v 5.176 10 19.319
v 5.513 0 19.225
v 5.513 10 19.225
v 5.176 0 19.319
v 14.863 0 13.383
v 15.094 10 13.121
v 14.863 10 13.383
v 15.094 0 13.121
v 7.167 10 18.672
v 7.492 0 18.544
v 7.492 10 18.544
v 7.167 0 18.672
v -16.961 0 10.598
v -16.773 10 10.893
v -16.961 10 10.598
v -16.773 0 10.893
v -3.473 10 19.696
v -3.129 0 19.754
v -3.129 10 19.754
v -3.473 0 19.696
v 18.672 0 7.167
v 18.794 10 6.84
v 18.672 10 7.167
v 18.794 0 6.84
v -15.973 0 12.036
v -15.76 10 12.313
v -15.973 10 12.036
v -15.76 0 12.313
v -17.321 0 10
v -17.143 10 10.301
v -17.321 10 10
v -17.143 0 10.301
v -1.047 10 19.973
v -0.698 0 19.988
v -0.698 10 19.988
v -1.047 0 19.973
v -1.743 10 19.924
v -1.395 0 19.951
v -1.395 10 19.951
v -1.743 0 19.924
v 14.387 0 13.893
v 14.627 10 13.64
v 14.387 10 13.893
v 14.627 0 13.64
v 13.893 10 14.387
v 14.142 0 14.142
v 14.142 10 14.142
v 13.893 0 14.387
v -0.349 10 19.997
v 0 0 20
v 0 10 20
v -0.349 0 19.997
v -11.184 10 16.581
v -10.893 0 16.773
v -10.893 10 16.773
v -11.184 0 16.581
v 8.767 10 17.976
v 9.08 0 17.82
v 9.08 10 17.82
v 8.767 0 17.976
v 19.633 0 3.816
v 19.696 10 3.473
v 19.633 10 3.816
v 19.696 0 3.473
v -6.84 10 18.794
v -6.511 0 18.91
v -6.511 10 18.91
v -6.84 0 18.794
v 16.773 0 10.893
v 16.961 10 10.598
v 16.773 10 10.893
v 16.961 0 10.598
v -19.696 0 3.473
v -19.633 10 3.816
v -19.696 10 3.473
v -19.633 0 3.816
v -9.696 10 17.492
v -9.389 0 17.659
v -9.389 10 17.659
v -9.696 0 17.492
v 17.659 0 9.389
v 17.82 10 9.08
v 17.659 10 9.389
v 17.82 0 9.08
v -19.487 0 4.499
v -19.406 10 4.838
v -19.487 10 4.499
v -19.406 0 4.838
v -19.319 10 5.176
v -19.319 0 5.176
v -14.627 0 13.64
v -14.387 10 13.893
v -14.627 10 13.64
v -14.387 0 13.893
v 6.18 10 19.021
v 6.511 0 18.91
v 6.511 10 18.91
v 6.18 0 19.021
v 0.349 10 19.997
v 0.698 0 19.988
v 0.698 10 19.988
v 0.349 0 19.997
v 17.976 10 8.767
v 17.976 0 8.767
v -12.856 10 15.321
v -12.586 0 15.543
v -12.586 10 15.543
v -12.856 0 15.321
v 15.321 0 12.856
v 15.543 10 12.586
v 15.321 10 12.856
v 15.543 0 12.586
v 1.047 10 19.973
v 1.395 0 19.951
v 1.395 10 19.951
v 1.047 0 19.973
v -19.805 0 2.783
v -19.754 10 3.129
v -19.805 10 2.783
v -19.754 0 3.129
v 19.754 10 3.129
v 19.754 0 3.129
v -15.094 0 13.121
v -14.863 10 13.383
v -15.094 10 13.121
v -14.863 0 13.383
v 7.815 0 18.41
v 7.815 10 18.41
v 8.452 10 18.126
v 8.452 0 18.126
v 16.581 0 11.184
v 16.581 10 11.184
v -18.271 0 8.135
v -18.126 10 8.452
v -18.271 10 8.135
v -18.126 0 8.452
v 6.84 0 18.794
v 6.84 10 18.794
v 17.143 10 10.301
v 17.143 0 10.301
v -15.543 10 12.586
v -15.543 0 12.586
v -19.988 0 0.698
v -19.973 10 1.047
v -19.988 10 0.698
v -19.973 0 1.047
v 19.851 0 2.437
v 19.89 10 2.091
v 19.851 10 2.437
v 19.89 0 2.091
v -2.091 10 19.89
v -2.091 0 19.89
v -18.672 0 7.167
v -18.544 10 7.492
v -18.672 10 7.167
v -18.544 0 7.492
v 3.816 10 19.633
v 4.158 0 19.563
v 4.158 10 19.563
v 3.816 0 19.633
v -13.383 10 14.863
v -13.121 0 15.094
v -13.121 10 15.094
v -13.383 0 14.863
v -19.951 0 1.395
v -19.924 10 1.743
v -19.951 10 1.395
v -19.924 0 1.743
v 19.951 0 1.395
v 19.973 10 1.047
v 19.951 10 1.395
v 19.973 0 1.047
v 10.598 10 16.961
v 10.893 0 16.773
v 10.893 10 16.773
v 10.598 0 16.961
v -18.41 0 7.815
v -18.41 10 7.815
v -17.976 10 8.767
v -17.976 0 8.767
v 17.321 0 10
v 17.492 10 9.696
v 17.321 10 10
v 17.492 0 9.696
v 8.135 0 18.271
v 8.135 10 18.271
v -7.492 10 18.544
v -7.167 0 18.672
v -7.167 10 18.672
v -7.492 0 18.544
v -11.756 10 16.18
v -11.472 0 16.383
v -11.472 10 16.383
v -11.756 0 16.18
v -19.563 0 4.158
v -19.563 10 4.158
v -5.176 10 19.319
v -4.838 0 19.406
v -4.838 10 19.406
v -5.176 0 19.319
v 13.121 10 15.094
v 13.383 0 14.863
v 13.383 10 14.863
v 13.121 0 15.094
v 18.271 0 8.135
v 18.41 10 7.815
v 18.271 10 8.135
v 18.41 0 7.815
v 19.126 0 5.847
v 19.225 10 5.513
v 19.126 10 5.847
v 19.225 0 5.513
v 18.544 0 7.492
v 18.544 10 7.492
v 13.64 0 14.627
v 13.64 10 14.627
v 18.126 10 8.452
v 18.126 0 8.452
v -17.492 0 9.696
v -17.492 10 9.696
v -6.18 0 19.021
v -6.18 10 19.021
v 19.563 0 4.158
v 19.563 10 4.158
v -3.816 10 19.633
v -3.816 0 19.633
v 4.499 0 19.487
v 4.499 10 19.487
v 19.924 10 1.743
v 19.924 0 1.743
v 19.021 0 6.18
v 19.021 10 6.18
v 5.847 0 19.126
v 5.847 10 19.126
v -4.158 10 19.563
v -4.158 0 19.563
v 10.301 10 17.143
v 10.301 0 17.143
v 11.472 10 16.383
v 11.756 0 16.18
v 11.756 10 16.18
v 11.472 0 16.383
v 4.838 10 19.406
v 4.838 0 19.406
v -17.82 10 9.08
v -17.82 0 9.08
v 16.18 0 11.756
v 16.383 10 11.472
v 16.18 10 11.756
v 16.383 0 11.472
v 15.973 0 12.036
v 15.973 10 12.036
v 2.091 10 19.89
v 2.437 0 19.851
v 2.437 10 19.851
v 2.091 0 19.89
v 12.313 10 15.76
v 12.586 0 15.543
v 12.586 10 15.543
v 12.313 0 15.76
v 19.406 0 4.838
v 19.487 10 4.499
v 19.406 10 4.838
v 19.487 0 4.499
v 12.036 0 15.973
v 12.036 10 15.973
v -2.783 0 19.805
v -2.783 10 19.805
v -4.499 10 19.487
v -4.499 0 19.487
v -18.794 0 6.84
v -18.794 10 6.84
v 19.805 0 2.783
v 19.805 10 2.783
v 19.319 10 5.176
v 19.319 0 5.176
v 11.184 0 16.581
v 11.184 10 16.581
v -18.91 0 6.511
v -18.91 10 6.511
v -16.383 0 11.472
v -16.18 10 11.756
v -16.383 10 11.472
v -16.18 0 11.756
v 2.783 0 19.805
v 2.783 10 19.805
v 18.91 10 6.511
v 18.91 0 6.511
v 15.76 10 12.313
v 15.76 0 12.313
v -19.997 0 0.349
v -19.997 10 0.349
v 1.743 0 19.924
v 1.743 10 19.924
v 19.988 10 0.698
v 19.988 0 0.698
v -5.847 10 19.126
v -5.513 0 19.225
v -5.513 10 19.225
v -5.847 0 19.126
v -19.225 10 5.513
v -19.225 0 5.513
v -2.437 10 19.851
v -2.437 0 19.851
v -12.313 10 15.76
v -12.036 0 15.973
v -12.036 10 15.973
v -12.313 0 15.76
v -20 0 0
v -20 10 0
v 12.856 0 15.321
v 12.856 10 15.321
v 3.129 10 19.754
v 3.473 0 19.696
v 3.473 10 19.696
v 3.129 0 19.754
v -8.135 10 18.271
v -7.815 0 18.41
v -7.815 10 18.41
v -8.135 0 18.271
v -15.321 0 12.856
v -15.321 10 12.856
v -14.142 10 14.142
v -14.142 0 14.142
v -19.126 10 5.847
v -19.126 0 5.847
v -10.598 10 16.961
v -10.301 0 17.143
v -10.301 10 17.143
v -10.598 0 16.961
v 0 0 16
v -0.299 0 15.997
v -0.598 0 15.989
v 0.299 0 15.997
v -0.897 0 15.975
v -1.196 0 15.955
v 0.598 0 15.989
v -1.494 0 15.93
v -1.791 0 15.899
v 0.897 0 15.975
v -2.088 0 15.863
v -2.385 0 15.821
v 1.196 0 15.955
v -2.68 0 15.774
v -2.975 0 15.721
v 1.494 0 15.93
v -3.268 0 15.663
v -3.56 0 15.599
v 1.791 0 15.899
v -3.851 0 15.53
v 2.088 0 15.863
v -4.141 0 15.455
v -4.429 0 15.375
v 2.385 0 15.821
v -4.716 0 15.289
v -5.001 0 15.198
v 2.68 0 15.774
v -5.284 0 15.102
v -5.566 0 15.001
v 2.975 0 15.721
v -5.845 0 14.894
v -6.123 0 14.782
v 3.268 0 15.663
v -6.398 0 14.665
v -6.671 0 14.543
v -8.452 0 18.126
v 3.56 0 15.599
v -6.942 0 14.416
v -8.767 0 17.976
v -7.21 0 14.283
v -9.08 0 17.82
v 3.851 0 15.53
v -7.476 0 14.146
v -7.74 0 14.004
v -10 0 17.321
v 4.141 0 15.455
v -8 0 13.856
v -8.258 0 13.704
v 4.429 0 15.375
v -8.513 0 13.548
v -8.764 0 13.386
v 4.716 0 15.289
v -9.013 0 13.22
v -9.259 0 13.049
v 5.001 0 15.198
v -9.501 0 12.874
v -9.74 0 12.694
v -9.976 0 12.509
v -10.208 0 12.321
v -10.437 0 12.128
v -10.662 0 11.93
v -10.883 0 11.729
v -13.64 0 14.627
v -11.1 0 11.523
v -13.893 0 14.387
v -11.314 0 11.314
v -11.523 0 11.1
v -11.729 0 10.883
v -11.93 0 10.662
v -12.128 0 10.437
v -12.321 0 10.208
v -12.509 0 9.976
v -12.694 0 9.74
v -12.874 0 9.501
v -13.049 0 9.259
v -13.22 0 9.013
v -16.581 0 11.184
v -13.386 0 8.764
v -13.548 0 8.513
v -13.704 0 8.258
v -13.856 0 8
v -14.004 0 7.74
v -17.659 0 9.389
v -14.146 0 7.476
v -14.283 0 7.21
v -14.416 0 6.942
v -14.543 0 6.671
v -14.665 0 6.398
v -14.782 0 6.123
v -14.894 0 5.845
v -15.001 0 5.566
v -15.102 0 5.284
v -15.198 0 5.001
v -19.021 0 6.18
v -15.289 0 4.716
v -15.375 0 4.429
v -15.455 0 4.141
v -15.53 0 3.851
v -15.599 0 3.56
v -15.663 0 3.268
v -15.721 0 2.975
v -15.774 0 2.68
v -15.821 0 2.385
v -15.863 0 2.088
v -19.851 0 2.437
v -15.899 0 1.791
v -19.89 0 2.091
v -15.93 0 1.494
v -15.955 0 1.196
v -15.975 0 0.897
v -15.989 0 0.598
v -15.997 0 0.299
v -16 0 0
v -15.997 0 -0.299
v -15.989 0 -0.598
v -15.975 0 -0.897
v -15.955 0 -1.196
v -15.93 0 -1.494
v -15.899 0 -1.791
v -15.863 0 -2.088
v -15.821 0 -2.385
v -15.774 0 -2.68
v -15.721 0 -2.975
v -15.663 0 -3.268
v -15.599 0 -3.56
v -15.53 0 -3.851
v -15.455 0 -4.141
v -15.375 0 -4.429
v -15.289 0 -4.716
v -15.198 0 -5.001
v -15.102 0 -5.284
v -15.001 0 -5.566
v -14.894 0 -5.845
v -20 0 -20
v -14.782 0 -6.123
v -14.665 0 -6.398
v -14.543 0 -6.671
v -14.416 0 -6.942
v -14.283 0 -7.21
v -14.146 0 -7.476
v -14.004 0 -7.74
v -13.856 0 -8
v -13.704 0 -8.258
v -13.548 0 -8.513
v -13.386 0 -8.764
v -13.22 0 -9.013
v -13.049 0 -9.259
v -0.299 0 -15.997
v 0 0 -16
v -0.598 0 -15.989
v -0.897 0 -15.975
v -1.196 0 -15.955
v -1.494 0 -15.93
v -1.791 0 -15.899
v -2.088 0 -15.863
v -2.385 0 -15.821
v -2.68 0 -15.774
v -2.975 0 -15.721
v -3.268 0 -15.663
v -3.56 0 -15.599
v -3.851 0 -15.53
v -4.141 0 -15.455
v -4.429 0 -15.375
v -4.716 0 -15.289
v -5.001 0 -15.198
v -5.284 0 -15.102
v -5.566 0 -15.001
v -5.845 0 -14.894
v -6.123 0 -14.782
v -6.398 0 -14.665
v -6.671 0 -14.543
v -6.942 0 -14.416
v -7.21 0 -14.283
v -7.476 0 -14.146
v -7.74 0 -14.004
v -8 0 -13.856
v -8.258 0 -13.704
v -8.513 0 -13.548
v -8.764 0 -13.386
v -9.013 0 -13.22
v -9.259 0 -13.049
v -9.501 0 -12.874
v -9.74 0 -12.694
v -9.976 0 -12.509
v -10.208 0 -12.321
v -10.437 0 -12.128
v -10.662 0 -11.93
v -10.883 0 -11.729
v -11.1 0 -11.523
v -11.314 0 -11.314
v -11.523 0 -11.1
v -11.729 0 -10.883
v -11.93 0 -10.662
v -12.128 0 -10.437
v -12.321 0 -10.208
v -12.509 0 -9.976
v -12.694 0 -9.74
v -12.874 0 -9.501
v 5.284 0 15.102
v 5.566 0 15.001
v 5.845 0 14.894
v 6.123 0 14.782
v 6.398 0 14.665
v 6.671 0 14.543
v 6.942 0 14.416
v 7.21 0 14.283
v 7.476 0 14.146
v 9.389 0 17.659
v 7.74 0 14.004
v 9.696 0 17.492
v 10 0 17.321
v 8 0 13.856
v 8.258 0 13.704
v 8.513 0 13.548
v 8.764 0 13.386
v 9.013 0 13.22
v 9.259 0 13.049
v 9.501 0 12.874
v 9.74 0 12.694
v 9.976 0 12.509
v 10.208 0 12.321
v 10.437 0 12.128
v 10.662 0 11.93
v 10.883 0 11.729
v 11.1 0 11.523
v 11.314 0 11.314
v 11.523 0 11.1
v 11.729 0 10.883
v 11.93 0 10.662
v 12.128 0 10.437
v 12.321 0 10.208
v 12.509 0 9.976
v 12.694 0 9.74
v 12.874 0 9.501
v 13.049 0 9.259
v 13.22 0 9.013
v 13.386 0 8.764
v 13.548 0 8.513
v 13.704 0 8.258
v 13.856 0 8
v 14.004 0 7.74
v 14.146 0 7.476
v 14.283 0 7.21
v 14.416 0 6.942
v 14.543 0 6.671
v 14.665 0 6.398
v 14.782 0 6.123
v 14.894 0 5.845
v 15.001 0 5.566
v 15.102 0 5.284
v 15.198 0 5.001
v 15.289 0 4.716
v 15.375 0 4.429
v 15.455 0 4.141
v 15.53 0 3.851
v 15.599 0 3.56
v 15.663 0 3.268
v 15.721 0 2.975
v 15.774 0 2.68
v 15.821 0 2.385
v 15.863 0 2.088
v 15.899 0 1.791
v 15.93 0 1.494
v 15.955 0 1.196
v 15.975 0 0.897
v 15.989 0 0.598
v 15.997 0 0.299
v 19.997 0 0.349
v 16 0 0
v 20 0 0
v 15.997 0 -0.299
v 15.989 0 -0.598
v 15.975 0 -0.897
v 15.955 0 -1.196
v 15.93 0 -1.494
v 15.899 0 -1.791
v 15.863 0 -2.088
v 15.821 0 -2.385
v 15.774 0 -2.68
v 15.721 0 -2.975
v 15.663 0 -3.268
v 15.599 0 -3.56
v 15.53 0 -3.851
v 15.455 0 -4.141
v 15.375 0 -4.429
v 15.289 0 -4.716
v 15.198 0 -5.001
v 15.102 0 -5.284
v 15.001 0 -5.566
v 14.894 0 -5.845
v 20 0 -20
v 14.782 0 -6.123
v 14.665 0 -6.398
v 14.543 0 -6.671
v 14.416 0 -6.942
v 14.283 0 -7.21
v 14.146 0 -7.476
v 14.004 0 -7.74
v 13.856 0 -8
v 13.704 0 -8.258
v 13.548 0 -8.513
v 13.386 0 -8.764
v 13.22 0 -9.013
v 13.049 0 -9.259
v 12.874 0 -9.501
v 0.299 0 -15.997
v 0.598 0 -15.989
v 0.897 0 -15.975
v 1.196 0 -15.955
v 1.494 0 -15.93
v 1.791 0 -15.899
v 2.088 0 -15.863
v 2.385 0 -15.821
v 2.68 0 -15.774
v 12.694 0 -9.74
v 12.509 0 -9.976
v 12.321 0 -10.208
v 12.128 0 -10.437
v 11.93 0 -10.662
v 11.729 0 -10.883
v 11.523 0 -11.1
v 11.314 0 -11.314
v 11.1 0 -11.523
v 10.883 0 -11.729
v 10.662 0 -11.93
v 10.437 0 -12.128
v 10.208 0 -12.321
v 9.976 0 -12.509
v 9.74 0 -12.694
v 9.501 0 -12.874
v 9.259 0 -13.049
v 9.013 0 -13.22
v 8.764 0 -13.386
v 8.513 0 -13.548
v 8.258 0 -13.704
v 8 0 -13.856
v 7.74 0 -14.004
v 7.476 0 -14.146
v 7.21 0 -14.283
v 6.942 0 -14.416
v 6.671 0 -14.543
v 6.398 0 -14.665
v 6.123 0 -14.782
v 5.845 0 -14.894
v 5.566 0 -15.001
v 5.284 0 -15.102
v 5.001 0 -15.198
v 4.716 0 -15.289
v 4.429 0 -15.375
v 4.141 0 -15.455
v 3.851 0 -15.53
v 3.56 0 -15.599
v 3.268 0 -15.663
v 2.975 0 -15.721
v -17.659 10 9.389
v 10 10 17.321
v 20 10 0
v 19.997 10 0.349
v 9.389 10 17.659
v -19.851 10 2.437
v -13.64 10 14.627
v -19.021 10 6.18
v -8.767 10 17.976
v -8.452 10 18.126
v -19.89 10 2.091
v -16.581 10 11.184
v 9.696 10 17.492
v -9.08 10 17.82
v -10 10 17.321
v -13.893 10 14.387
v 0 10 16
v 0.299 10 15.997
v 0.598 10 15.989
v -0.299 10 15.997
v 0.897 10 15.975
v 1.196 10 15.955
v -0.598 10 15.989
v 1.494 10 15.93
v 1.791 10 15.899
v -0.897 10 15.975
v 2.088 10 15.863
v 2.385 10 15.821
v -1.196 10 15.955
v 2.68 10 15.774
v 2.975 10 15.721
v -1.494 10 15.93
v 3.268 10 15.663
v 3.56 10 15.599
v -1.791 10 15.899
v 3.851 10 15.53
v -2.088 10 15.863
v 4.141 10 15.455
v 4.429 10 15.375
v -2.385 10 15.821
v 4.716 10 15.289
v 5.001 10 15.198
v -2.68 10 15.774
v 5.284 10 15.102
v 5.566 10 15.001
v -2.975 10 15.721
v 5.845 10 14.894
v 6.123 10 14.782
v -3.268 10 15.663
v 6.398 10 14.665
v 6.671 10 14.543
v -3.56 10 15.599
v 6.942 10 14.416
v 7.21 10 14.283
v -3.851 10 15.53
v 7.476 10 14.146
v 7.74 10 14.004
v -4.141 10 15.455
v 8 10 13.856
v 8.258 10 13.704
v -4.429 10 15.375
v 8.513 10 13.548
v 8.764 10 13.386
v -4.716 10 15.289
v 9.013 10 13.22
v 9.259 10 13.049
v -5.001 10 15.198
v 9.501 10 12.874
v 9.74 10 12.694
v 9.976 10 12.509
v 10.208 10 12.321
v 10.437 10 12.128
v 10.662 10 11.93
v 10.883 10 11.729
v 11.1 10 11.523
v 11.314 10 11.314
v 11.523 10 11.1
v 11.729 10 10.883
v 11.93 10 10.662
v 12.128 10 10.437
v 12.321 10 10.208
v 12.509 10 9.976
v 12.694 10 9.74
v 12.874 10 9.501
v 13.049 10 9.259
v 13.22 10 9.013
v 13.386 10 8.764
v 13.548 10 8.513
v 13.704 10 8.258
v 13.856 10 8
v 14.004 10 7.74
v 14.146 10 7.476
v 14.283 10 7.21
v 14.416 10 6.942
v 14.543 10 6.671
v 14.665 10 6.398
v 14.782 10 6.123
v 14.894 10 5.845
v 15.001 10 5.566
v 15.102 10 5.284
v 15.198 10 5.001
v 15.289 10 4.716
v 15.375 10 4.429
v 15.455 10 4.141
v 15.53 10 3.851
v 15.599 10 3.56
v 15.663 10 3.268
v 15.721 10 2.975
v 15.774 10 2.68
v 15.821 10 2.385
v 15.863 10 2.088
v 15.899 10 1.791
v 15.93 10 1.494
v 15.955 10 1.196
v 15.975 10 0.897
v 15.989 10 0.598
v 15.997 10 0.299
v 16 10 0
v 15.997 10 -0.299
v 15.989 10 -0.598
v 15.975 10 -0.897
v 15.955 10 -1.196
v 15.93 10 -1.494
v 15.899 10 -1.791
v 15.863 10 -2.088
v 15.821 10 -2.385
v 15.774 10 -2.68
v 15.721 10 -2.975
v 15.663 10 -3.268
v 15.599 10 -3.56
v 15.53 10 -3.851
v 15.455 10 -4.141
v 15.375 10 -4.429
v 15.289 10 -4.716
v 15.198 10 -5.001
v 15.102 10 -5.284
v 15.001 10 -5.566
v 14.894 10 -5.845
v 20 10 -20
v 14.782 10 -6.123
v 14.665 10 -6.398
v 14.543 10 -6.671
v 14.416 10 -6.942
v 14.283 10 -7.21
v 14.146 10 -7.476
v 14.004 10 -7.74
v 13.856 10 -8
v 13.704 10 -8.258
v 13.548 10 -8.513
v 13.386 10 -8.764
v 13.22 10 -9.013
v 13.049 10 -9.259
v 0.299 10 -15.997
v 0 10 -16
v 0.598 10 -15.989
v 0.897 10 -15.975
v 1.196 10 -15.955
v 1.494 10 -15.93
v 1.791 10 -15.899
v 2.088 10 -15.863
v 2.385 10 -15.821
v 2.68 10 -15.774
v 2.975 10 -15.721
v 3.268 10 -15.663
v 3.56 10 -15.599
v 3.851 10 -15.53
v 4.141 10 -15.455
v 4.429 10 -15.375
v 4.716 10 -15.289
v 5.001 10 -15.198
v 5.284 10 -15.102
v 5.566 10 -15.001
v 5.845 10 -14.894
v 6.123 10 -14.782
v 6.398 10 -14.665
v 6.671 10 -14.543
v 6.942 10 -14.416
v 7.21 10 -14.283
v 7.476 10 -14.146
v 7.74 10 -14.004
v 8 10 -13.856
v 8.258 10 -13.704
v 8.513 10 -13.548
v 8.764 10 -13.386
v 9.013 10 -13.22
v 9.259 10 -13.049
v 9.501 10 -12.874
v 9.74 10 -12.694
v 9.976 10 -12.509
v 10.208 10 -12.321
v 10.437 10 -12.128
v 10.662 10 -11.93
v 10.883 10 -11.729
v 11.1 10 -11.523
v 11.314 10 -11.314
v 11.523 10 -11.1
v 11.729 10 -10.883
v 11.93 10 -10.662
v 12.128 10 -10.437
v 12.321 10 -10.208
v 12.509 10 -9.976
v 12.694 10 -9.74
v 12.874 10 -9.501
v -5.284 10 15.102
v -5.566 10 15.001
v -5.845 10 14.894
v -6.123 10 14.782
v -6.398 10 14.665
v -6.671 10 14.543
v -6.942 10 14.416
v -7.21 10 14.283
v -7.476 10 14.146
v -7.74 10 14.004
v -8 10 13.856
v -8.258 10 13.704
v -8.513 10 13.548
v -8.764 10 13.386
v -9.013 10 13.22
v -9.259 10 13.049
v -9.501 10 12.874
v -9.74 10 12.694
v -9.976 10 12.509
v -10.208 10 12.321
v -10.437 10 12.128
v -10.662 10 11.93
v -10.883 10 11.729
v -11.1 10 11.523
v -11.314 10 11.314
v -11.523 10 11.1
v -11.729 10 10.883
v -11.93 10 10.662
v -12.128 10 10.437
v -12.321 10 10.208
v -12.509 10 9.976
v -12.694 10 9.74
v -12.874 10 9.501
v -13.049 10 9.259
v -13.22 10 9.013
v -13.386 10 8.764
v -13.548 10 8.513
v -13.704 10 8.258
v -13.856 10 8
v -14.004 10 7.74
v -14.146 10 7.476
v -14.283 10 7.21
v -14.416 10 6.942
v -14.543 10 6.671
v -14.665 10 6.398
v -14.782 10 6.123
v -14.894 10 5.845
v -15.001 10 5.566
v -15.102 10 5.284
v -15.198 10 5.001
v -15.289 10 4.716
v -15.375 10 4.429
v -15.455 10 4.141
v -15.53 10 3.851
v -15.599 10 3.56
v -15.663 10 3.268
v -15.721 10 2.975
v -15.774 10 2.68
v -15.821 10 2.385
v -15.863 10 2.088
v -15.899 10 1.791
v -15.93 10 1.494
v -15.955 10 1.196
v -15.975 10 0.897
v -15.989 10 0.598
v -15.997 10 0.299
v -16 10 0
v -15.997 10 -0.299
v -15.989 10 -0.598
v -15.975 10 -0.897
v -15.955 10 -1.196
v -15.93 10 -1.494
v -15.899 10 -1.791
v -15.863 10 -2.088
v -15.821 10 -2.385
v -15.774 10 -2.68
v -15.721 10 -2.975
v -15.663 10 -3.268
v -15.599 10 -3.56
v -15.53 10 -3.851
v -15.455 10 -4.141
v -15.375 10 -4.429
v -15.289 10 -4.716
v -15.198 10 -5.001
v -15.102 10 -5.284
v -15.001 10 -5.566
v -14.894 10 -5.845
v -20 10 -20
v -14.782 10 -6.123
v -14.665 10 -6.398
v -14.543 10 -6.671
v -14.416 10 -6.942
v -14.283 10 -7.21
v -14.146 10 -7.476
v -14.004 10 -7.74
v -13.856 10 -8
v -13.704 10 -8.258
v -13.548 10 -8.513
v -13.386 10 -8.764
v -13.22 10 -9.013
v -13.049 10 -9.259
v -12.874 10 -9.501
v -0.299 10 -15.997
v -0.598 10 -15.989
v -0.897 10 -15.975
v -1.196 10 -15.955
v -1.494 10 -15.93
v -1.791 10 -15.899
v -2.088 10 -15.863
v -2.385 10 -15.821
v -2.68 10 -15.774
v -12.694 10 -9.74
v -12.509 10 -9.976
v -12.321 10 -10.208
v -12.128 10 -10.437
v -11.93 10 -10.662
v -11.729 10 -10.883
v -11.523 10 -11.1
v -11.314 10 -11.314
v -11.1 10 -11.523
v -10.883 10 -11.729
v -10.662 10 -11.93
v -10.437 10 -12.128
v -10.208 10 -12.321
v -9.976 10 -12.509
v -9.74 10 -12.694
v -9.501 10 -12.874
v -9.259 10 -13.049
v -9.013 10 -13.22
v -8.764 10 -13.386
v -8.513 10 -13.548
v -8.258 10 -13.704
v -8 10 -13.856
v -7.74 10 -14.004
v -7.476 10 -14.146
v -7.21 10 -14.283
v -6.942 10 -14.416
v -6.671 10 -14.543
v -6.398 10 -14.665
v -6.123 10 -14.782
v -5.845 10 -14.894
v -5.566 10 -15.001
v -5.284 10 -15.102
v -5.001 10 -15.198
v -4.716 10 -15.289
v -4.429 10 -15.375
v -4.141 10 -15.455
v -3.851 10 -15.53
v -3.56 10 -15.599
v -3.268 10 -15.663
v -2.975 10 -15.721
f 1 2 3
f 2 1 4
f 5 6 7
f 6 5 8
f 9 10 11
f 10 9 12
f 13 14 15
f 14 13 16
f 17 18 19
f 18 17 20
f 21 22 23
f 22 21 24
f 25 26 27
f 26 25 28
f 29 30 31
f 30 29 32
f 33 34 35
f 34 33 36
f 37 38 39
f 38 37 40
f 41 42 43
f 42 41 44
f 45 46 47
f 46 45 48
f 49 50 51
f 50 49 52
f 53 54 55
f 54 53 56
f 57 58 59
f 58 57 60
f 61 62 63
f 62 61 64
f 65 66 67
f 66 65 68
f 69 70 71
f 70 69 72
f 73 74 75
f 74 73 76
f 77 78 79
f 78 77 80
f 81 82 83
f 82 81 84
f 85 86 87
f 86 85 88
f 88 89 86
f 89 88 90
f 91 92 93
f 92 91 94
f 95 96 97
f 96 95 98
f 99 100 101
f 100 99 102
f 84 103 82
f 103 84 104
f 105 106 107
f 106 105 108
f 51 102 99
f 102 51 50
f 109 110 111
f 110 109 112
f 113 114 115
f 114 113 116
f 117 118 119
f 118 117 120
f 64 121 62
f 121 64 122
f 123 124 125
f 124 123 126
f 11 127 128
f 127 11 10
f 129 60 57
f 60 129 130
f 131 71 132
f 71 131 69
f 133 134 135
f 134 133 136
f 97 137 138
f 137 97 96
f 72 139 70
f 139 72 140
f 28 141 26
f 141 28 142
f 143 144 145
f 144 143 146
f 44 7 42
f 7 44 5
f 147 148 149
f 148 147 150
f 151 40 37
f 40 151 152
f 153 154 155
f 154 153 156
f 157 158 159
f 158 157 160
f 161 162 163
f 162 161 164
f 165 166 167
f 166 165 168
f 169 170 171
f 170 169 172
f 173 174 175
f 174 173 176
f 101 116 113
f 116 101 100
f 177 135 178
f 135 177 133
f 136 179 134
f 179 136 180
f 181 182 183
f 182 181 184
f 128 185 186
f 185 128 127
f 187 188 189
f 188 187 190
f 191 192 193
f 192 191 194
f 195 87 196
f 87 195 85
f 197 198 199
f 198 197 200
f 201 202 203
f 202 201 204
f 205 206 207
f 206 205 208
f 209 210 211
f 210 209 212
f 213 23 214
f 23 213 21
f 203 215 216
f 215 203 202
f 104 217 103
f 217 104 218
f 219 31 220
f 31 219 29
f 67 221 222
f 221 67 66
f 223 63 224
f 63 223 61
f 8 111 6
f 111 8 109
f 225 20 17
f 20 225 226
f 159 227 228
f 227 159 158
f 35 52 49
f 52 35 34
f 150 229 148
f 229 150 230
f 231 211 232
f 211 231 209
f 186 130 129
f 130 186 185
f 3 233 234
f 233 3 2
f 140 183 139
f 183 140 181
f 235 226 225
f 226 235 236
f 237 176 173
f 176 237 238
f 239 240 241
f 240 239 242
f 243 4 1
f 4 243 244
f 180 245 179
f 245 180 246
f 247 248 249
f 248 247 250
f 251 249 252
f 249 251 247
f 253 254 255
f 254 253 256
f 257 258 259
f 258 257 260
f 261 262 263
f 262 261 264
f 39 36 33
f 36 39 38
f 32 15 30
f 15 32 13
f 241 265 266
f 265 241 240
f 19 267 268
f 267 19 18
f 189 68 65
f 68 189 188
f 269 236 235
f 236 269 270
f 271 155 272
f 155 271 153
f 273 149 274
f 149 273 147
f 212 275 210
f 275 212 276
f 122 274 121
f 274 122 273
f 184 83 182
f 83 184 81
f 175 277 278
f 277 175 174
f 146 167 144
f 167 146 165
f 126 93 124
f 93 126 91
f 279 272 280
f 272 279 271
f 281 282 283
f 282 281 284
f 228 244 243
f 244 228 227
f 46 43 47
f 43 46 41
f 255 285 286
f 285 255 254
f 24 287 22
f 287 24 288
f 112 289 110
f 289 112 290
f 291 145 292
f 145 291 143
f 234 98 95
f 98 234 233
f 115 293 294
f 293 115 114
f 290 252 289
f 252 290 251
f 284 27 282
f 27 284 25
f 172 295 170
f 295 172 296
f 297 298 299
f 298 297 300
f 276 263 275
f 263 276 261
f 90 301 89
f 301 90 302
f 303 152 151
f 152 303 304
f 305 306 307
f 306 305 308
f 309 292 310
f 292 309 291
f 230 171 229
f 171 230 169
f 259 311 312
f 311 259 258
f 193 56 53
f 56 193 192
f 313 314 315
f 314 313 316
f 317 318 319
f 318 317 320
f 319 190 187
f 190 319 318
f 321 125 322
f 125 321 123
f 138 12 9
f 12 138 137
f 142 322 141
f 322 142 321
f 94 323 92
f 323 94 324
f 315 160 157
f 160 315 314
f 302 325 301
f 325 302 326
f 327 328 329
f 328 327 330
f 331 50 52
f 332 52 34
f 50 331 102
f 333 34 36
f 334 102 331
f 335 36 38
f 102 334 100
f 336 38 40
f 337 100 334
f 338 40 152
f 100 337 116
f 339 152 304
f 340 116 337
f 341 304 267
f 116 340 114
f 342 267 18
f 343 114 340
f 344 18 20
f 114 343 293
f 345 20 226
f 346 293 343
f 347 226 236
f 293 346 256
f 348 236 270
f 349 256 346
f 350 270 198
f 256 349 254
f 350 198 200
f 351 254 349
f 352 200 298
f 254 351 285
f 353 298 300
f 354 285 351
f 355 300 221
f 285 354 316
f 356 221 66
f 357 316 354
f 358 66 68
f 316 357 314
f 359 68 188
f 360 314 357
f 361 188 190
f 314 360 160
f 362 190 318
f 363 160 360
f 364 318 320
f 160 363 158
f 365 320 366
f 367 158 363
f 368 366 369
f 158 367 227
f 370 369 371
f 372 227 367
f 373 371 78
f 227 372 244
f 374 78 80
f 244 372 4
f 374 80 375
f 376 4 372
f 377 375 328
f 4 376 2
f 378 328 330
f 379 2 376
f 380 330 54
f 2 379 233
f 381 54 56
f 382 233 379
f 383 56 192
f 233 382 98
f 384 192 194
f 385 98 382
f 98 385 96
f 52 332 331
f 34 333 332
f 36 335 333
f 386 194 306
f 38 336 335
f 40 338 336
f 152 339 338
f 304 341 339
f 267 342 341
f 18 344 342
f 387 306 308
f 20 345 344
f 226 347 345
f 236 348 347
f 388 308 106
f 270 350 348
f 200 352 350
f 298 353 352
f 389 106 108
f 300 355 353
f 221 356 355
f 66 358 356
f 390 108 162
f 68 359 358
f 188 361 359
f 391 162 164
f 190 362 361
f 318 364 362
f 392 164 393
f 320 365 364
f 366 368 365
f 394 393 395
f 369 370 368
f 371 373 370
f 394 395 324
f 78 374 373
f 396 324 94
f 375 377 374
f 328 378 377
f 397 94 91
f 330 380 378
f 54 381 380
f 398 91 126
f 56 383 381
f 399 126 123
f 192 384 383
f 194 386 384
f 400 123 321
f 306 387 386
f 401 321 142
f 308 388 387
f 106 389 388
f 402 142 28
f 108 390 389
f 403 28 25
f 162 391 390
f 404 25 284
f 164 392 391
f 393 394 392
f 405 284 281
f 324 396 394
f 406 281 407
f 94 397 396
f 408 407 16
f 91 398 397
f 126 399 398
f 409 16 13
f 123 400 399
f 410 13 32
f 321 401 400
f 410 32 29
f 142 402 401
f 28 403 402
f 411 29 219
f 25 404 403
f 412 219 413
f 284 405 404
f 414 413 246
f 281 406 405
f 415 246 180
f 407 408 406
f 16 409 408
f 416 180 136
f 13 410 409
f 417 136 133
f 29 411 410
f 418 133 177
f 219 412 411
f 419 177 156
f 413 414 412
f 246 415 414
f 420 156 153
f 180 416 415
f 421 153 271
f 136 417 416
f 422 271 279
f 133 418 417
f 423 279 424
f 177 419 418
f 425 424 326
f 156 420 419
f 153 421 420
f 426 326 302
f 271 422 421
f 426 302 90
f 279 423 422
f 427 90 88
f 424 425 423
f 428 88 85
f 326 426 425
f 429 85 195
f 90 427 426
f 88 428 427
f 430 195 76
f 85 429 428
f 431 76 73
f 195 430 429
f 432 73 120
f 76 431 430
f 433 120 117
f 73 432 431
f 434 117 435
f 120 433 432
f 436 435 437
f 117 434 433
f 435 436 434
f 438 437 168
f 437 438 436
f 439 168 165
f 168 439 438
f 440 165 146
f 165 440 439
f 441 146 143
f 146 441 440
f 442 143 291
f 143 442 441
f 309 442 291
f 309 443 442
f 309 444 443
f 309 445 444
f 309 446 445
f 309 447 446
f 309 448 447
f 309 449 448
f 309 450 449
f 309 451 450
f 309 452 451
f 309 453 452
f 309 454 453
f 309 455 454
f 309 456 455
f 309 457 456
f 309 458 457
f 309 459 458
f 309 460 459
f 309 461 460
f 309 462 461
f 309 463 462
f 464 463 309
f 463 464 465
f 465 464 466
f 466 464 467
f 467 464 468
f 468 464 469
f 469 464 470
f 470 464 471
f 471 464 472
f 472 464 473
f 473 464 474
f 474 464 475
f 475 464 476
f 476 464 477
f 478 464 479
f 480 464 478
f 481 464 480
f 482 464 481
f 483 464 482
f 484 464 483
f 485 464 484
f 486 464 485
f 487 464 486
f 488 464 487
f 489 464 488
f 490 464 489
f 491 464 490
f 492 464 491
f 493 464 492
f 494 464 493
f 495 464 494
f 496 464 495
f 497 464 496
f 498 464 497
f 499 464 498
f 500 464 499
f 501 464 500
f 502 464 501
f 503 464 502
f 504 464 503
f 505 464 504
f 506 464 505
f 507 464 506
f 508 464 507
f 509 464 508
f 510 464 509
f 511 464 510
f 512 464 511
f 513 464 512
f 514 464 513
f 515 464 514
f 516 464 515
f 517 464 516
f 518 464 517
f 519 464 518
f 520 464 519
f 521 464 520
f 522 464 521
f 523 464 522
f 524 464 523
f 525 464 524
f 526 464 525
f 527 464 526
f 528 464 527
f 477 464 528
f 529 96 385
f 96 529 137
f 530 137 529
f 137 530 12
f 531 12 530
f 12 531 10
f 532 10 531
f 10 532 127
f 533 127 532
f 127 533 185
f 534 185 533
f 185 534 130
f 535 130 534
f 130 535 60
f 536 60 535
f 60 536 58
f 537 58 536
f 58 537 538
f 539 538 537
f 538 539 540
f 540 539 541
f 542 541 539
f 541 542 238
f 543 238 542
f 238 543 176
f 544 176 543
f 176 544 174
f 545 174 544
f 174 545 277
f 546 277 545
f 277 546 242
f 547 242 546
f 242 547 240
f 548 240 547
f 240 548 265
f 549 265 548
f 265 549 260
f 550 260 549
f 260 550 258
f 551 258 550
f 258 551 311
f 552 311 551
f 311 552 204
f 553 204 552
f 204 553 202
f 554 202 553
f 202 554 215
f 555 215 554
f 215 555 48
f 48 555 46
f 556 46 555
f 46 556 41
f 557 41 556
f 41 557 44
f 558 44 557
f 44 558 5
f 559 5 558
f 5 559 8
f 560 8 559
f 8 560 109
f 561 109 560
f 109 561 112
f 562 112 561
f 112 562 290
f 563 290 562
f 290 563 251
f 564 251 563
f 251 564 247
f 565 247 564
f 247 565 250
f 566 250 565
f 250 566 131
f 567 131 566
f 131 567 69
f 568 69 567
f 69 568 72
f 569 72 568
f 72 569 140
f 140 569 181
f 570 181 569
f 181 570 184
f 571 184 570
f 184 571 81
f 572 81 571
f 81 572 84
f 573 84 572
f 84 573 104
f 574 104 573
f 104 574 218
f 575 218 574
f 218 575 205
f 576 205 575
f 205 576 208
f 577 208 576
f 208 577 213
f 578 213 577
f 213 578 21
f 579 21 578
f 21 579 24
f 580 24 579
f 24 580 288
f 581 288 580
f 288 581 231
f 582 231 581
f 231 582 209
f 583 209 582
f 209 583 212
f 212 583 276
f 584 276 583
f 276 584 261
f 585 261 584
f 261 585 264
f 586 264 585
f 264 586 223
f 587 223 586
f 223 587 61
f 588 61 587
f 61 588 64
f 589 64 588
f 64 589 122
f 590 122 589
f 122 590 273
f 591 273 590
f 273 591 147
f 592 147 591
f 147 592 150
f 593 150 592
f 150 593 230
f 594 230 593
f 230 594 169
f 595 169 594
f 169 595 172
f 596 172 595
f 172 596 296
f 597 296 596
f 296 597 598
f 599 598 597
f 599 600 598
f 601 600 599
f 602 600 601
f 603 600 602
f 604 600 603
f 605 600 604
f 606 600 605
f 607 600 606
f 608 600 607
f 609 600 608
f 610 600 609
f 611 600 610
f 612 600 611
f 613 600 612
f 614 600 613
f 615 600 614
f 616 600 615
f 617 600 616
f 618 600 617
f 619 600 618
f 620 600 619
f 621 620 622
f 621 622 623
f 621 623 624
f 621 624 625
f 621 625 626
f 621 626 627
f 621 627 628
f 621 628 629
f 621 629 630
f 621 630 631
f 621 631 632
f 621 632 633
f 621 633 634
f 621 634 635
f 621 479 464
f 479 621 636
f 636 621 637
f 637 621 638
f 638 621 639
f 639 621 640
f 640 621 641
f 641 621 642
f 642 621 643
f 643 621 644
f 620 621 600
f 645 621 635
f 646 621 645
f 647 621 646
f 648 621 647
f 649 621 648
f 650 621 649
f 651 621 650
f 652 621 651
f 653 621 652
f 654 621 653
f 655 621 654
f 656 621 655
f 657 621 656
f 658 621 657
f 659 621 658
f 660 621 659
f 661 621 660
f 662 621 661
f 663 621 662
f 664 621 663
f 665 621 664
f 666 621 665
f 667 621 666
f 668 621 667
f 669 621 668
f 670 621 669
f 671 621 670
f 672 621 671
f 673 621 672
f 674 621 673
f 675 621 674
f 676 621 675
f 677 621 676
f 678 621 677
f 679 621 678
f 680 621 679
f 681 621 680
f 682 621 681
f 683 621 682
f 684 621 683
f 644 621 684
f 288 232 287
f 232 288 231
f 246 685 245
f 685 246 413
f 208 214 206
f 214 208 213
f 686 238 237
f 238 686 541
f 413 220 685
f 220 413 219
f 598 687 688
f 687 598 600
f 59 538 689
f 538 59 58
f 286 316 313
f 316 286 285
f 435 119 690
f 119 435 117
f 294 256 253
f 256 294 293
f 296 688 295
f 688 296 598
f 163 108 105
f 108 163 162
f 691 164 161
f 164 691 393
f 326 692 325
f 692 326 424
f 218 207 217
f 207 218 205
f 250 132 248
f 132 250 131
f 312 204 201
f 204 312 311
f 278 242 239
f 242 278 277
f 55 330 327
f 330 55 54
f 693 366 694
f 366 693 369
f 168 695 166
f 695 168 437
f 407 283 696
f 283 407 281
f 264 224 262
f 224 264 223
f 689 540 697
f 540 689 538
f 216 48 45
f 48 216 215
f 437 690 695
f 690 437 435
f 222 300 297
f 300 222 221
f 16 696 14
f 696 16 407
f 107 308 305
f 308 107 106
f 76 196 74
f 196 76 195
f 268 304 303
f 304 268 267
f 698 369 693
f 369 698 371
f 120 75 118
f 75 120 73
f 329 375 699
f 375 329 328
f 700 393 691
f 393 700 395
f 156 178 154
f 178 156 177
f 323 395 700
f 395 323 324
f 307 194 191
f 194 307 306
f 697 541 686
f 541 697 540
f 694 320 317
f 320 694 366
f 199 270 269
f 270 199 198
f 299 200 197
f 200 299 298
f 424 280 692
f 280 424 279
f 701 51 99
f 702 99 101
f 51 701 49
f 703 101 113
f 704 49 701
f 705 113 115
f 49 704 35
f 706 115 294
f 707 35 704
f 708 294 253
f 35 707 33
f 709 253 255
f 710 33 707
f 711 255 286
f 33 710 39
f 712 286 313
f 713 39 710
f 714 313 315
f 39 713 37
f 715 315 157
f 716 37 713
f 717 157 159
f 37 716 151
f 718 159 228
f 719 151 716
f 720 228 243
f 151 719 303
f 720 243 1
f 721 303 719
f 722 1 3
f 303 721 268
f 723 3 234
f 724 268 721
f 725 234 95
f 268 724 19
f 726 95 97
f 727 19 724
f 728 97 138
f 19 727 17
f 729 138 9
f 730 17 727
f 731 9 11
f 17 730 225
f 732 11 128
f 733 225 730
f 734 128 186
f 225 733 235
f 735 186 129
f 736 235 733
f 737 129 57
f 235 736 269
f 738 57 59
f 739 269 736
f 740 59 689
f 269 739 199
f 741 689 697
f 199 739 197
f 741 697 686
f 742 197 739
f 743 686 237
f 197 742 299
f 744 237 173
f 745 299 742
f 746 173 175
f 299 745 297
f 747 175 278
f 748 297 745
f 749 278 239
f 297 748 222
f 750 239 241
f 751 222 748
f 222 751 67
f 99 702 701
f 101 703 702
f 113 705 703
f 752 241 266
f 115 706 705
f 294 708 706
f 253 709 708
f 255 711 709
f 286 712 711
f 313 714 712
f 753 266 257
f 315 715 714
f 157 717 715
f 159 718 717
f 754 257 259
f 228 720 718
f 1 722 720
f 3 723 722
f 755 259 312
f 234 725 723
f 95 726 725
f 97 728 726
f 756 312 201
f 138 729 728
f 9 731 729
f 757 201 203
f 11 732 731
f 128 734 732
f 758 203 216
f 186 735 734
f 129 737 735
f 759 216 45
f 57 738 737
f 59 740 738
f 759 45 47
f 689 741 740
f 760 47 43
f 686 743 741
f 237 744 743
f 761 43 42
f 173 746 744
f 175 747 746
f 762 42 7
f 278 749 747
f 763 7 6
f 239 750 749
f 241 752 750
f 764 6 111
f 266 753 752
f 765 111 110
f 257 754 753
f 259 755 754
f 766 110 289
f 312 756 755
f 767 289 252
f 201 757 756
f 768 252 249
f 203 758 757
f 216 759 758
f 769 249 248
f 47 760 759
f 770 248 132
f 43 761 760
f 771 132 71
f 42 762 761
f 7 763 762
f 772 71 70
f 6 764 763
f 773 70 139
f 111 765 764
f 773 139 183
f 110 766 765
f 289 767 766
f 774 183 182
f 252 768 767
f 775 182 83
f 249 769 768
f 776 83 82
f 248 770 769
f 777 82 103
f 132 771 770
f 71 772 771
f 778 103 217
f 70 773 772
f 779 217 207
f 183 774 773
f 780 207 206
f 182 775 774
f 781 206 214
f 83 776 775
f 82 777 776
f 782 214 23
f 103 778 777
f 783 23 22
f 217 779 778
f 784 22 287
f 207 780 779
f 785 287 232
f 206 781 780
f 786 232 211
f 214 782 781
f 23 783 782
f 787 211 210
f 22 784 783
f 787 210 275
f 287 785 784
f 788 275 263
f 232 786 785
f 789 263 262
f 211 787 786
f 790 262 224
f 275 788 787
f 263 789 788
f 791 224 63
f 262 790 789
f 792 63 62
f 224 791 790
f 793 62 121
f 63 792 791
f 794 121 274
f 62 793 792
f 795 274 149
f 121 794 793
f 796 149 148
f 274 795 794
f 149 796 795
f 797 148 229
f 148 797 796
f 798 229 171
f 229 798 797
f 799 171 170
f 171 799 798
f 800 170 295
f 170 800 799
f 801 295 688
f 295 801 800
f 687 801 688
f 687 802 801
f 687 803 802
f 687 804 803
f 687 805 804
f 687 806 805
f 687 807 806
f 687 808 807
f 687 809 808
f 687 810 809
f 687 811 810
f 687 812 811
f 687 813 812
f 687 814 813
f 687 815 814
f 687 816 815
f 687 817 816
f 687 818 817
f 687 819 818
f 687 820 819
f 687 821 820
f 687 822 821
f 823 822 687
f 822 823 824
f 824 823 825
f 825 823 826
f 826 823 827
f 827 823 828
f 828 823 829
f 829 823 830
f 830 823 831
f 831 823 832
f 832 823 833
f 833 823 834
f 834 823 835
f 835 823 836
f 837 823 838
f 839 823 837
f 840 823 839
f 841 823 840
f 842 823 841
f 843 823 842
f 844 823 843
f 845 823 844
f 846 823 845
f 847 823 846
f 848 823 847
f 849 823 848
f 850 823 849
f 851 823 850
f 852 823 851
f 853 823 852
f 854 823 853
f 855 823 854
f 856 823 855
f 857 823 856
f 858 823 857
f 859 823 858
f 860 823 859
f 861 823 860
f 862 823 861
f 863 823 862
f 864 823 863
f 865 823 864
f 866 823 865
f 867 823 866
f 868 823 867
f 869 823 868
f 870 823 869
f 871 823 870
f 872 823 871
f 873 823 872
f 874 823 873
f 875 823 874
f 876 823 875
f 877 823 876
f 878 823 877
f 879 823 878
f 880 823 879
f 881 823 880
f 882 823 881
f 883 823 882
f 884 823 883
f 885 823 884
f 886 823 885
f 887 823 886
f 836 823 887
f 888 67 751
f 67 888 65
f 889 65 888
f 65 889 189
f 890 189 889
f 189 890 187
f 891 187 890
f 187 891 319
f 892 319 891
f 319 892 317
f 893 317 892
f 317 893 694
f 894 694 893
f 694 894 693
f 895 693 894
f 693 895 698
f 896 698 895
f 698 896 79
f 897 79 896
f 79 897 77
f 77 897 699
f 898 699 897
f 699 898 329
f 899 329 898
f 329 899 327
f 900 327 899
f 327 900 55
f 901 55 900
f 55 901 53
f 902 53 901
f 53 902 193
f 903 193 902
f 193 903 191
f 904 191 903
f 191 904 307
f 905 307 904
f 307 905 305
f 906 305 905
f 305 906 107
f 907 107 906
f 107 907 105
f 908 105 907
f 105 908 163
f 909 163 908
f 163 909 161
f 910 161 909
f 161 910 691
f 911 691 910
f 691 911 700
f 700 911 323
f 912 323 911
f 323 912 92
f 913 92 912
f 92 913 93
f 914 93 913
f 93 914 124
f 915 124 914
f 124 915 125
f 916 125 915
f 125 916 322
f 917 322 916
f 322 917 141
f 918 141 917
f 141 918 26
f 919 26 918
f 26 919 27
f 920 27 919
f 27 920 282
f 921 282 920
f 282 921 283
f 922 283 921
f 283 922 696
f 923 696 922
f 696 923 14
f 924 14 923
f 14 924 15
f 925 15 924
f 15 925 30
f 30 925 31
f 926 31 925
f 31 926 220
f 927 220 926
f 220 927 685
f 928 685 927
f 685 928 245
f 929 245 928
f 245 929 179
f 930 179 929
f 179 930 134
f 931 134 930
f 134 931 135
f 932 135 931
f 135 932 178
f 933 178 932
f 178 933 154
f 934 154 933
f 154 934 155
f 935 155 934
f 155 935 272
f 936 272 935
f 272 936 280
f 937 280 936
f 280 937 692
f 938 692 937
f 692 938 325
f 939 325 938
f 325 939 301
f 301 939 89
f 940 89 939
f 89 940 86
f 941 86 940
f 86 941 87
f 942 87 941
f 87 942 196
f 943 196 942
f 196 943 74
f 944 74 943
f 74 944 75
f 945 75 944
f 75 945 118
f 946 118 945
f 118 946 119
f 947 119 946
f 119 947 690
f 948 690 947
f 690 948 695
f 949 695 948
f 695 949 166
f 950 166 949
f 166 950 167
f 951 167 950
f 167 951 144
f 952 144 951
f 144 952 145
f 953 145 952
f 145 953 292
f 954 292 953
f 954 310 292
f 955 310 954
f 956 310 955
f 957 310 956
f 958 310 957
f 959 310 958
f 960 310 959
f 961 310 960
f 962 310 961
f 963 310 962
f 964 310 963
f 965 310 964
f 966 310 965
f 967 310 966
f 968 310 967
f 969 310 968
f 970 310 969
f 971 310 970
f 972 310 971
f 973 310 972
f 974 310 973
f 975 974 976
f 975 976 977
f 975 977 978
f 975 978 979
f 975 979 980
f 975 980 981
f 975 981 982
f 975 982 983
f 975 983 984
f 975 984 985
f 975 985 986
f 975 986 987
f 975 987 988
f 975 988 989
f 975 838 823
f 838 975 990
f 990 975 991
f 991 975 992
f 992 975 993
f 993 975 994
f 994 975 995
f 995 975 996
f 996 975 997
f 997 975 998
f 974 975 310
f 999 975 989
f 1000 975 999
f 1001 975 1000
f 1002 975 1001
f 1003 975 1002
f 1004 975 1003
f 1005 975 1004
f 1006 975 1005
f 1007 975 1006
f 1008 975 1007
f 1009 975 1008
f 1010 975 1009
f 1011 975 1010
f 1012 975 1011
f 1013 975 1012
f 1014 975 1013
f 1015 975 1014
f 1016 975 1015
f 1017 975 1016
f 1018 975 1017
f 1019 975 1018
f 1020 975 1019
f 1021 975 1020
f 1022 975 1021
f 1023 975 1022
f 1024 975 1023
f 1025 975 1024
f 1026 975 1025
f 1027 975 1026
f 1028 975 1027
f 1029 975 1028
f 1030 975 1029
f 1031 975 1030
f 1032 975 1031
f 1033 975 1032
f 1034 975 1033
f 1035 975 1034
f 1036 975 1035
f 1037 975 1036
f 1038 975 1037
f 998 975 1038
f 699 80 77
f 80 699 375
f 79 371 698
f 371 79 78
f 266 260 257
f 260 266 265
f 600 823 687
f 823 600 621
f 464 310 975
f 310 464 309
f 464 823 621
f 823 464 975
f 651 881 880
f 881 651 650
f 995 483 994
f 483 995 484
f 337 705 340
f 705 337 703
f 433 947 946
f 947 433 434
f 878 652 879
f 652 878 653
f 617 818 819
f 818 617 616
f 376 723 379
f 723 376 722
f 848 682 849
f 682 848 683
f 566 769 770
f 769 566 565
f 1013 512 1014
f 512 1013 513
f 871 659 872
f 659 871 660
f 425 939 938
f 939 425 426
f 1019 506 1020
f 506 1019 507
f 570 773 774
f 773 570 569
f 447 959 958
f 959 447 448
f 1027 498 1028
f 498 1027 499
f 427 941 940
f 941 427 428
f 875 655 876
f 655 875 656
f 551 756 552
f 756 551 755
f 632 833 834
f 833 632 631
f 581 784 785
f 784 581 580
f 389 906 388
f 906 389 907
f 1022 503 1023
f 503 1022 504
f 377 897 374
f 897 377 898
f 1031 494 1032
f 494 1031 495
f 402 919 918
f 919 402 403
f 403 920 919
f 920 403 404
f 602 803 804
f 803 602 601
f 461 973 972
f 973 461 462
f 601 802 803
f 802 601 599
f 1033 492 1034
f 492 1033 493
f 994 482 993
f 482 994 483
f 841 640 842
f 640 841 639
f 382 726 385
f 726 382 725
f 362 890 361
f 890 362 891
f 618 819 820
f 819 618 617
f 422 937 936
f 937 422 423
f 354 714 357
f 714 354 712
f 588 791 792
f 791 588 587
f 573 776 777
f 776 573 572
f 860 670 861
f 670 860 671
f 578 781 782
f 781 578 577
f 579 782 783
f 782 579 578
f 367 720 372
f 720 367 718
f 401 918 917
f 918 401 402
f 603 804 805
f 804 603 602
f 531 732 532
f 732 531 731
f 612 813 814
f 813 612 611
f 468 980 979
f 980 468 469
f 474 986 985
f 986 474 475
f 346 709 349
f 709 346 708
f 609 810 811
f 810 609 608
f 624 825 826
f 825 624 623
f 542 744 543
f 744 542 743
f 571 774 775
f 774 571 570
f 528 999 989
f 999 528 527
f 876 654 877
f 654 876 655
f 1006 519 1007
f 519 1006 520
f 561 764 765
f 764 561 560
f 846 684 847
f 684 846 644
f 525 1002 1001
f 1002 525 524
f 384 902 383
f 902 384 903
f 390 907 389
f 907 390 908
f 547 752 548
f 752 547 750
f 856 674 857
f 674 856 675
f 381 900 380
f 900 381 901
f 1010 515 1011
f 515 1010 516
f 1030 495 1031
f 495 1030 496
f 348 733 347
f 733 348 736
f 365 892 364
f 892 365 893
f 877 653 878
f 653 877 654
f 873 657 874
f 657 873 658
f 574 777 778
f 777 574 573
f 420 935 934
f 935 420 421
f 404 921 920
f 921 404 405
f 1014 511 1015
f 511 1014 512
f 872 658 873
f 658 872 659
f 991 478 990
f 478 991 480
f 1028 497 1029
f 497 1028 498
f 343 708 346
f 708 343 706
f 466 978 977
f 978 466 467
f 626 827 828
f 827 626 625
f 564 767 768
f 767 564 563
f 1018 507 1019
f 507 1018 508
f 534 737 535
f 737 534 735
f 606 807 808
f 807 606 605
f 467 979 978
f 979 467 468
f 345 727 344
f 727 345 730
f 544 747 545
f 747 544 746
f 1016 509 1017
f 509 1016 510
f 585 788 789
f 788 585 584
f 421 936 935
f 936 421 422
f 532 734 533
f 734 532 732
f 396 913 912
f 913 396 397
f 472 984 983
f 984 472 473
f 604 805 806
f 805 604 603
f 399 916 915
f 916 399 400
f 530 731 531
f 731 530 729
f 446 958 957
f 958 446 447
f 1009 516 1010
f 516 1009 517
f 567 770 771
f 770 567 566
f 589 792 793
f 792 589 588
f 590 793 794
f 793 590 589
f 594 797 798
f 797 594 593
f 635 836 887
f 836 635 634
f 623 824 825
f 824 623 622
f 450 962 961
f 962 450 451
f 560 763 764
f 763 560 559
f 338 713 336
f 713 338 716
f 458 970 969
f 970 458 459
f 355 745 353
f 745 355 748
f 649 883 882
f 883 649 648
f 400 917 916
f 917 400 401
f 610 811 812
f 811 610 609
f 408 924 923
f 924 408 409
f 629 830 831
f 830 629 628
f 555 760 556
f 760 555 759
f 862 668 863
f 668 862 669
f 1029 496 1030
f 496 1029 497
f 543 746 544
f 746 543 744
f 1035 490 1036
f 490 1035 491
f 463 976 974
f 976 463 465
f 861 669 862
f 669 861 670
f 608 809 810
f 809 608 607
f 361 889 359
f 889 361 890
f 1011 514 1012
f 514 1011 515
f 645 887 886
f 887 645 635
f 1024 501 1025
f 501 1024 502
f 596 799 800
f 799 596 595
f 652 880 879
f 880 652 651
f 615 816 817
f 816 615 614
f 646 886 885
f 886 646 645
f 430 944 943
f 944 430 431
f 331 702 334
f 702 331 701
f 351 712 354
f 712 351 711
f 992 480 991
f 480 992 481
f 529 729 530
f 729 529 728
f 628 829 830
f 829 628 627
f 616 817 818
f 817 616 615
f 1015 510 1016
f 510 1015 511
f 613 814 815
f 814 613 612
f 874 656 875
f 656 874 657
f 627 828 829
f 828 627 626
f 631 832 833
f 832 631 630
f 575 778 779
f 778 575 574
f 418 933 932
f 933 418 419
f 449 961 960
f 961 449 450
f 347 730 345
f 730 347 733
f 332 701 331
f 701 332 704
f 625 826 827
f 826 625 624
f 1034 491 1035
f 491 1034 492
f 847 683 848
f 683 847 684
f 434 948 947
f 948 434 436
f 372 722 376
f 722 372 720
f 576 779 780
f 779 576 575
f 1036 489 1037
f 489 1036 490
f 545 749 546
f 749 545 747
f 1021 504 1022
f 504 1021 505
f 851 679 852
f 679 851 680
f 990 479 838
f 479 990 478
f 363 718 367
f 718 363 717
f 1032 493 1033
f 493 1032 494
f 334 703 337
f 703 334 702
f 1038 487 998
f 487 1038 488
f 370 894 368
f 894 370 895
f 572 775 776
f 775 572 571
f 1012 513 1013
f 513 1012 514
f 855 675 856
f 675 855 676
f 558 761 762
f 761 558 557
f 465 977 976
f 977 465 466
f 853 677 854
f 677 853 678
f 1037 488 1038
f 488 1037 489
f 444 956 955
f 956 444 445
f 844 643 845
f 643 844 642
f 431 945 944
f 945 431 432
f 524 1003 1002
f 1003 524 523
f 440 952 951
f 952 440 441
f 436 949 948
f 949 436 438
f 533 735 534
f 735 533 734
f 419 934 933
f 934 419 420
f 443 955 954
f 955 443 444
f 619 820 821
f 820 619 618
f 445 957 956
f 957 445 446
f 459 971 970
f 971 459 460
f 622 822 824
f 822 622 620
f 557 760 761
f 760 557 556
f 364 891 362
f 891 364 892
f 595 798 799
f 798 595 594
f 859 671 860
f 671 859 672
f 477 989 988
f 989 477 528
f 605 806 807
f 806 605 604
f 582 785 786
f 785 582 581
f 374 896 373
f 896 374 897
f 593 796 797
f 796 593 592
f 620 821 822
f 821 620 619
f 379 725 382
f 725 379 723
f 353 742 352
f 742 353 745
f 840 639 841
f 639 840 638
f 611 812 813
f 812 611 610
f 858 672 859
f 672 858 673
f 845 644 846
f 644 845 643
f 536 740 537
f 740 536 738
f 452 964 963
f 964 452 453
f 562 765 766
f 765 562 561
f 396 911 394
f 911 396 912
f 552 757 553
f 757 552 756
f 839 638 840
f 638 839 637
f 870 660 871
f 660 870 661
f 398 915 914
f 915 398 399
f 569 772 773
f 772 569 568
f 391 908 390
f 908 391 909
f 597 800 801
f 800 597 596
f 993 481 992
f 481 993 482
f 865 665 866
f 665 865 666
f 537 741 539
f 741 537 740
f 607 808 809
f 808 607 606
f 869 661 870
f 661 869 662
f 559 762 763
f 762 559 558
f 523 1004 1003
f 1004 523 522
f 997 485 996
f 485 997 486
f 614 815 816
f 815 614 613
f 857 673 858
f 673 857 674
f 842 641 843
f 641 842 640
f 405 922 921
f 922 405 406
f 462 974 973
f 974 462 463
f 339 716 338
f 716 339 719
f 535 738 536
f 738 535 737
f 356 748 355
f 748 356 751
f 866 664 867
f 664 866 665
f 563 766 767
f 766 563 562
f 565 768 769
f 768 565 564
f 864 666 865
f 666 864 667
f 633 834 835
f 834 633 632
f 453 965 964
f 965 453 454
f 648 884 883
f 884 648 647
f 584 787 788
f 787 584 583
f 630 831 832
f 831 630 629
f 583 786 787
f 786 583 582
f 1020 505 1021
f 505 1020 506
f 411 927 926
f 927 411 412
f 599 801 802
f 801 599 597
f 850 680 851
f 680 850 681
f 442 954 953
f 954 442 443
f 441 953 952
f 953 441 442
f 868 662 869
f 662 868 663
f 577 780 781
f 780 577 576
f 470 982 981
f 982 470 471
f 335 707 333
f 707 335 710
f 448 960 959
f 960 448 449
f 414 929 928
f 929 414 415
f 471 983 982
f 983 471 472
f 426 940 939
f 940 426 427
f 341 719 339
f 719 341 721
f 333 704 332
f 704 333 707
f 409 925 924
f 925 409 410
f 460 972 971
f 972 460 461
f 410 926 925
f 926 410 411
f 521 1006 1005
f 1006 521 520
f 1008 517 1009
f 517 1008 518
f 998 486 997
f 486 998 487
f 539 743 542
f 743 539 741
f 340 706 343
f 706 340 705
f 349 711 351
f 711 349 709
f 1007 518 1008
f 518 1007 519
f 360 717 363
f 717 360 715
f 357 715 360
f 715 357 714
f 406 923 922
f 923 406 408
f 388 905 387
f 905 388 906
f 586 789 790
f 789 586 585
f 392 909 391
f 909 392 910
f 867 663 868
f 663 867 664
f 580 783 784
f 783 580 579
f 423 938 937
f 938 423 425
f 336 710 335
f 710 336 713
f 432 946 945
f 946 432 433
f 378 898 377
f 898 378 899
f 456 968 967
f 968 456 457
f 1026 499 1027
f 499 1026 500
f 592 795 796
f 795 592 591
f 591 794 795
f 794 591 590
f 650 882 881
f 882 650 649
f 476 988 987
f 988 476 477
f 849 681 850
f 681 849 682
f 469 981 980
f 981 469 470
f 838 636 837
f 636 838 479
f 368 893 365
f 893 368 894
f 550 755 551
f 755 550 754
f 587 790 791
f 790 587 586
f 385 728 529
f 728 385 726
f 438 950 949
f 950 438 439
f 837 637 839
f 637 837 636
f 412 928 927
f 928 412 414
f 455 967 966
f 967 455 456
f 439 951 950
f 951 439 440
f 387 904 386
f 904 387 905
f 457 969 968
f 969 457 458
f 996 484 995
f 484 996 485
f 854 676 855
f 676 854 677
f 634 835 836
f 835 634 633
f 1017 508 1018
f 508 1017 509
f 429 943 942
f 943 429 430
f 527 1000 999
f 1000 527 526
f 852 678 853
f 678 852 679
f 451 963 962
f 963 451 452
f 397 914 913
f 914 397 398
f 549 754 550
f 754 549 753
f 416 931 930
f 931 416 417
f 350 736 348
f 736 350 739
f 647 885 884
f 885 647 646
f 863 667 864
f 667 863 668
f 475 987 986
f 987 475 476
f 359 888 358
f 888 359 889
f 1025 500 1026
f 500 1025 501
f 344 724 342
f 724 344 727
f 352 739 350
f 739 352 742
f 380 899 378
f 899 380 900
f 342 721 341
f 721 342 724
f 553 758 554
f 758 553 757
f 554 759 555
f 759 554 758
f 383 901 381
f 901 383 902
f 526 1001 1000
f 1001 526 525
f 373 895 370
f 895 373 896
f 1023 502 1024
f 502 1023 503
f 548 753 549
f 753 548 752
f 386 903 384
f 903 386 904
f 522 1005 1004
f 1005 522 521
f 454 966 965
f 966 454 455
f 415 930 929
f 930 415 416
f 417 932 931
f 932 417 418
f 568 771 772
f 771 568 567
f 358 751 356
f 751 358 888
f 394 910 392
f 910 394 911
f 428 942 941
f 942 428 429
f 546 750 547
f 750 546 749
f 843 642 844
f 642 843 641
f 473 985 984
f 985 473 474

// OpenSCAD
$fs = 0.3;
$fa = 1;

rotate([-90, 0, 0]) {
	difference() {
		union() {
			cylinder(r=20, h=10);
			translate([-20, 0, 0]) {
				cube([40, 20, 10]);
			}
		}
		translate([0, 0, -1]) {
			cylinder(r=16, h=12);
		}
	}
}
